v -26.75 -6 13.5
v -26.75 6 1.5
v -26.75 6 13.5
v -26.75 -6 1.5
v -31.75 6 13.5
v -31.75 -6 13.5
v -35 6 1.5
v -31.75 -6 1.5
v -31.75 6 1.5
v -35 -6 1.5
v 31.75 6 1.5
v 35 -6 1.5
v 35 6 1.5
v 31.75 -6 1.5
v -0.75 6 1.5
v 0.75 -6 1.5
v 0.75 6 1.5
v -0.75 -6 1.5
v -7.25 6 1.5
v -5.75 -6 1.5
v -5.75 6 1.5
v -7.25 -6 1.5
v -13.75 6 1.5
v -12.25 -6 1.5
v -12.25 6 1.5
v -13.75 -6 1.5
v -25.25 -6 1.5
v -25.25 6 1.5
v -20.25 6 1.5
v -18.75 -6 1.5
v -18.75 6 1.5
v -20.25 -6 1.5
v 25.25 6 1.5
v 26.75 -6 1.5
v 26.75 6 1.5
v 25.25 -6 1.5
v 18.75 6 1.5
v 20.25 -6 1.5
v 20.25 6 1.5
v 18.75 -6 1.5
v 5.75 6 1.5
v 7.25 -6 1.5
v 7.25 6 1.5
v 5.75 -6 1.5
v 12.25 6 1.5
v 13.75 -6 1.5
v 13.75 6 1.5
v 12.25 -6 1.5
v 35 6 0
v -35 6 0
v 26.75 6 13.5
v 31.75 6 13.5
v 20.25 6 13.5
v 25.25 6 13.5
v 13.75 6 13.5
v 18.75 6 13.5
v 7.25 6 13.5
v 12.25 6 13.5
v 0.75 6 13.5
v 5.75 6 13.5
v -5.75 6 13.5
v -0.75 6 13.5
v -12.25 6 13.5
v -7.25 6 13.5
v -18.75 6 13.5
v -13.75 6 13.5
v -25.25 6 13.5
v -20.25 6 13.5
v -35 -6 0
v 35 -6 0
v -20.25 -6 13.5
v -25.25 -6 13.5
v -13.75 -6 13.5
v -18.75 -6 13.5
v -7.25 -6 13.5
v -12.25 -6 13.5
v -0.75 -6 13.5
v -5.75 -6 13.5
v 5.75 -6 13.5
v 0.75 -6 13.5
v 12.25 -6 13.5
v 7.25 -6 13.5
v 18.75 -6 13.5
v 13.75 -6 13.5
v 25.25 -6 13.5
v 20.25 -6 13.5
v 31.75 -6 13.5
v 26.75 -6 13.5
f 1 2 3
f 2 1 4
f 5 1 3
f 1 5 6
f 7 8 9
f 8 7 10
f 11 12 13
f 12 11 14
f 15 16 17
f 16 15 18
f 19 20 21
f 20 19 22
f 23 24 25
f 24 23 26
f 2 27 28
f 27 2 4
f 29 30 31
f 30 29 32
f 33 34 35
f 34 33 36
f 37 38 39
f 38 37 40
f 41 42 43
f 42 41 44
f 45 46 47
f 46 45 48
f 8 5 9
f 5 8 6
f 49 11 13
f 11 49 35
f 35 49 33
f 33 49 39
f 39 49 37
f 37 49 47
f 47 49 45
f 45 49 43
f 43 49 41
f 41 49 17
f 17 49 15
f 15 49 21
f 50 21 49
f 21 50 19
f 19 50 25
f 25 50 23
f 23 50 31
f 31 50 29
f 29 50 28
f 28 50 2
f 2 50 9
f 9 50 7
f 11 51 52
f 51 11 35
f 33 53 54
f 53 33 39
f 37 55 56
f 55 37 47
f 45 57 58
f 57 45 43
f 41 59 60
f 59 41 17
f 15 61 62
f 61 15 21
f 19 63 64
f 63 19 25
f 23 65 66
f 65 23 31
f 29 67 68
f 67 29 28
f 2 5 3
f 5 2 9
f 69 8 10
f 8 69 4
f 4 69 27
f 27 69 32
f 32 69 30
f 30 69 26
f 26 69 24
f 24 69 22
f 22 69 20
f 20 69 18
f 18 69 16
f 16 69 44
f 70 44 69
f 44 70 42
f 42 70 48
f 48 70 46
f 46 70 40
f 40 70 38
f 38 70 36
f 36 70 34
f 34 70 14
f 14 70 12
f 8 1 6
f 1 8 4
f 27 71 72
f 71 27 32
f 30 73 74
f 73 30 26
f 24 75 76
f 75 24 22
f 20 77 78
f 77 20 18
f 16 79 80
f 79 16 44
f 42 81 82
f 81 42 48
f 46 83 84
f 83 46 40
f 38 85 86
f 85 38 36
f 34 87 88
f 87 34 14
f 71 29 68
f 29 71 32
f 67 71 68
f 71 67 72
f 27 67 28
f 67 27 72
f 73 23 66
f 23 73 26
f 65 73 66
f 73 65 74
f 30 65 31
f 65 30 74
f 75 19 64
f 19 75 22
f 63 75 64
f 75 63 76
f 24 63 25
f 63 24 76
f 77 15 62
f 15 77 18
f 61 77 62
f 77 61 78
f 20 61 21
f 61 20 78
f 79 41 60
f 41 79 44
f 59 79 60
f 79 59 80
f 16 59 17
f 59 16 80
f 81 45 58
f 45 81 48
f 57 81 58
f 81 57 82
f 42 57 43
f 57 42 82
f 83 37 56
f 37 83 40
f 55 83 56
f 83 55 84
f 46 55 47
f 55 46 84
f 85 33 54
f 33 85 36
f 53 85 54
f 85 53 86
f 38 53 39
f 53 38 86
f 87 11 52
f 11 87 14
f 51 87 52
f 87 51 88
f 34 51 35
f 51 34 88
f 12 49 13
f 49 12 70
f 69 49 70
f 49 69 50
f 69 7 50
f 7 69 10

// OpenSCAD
// 10-well comb for agarose gel casting
// Print orientation: flat on bed, teeth pointing down (-Z)

// ---------- Parameters ----------
plate_t      = 1.5;   // plate thickness (Z)
spine_len    = 70;    // spine length (X)
spine_w      = 12;    // spine width (Y)
tooth_count  = 10;    // number of teeth
tooth_w      = 5.0;   // tooth width (X)
tooth_len    = 12;    // tooth length (Y)
tooth_h      = 12;    // tooth height from plate top (Z)
gap          = 1.5;   // gap between teeth (X)
eps          = 0.5;   // cutter overshoot past faces

$fn = 64;

// ---------- Derived ----------
pitch   = tooth_w + gap;
x0      = -(tooth_count - 1) * pitch / 2;   // first tooth centre (row centred on spine)
reach   = max(eps, tooth_h);                // cutter must pass through the top face

// ---------- Model ----------
union() {
    // Plate with spine
    translate([-spine_len / 2, -spine_w / 2, 0])
        cube([spine_len, spine_w, plate_t]);

    // Teeth hanging from the +Y edge of the spine
    for (i = [0 : tooth_count - 1])
        translate([x0 + i * pitch - tooth_w / 2,
                   spine_w / 2 - tooth_len,
                   plate_t])
            cube([tooth_w, tooth_len, reach]);
}
